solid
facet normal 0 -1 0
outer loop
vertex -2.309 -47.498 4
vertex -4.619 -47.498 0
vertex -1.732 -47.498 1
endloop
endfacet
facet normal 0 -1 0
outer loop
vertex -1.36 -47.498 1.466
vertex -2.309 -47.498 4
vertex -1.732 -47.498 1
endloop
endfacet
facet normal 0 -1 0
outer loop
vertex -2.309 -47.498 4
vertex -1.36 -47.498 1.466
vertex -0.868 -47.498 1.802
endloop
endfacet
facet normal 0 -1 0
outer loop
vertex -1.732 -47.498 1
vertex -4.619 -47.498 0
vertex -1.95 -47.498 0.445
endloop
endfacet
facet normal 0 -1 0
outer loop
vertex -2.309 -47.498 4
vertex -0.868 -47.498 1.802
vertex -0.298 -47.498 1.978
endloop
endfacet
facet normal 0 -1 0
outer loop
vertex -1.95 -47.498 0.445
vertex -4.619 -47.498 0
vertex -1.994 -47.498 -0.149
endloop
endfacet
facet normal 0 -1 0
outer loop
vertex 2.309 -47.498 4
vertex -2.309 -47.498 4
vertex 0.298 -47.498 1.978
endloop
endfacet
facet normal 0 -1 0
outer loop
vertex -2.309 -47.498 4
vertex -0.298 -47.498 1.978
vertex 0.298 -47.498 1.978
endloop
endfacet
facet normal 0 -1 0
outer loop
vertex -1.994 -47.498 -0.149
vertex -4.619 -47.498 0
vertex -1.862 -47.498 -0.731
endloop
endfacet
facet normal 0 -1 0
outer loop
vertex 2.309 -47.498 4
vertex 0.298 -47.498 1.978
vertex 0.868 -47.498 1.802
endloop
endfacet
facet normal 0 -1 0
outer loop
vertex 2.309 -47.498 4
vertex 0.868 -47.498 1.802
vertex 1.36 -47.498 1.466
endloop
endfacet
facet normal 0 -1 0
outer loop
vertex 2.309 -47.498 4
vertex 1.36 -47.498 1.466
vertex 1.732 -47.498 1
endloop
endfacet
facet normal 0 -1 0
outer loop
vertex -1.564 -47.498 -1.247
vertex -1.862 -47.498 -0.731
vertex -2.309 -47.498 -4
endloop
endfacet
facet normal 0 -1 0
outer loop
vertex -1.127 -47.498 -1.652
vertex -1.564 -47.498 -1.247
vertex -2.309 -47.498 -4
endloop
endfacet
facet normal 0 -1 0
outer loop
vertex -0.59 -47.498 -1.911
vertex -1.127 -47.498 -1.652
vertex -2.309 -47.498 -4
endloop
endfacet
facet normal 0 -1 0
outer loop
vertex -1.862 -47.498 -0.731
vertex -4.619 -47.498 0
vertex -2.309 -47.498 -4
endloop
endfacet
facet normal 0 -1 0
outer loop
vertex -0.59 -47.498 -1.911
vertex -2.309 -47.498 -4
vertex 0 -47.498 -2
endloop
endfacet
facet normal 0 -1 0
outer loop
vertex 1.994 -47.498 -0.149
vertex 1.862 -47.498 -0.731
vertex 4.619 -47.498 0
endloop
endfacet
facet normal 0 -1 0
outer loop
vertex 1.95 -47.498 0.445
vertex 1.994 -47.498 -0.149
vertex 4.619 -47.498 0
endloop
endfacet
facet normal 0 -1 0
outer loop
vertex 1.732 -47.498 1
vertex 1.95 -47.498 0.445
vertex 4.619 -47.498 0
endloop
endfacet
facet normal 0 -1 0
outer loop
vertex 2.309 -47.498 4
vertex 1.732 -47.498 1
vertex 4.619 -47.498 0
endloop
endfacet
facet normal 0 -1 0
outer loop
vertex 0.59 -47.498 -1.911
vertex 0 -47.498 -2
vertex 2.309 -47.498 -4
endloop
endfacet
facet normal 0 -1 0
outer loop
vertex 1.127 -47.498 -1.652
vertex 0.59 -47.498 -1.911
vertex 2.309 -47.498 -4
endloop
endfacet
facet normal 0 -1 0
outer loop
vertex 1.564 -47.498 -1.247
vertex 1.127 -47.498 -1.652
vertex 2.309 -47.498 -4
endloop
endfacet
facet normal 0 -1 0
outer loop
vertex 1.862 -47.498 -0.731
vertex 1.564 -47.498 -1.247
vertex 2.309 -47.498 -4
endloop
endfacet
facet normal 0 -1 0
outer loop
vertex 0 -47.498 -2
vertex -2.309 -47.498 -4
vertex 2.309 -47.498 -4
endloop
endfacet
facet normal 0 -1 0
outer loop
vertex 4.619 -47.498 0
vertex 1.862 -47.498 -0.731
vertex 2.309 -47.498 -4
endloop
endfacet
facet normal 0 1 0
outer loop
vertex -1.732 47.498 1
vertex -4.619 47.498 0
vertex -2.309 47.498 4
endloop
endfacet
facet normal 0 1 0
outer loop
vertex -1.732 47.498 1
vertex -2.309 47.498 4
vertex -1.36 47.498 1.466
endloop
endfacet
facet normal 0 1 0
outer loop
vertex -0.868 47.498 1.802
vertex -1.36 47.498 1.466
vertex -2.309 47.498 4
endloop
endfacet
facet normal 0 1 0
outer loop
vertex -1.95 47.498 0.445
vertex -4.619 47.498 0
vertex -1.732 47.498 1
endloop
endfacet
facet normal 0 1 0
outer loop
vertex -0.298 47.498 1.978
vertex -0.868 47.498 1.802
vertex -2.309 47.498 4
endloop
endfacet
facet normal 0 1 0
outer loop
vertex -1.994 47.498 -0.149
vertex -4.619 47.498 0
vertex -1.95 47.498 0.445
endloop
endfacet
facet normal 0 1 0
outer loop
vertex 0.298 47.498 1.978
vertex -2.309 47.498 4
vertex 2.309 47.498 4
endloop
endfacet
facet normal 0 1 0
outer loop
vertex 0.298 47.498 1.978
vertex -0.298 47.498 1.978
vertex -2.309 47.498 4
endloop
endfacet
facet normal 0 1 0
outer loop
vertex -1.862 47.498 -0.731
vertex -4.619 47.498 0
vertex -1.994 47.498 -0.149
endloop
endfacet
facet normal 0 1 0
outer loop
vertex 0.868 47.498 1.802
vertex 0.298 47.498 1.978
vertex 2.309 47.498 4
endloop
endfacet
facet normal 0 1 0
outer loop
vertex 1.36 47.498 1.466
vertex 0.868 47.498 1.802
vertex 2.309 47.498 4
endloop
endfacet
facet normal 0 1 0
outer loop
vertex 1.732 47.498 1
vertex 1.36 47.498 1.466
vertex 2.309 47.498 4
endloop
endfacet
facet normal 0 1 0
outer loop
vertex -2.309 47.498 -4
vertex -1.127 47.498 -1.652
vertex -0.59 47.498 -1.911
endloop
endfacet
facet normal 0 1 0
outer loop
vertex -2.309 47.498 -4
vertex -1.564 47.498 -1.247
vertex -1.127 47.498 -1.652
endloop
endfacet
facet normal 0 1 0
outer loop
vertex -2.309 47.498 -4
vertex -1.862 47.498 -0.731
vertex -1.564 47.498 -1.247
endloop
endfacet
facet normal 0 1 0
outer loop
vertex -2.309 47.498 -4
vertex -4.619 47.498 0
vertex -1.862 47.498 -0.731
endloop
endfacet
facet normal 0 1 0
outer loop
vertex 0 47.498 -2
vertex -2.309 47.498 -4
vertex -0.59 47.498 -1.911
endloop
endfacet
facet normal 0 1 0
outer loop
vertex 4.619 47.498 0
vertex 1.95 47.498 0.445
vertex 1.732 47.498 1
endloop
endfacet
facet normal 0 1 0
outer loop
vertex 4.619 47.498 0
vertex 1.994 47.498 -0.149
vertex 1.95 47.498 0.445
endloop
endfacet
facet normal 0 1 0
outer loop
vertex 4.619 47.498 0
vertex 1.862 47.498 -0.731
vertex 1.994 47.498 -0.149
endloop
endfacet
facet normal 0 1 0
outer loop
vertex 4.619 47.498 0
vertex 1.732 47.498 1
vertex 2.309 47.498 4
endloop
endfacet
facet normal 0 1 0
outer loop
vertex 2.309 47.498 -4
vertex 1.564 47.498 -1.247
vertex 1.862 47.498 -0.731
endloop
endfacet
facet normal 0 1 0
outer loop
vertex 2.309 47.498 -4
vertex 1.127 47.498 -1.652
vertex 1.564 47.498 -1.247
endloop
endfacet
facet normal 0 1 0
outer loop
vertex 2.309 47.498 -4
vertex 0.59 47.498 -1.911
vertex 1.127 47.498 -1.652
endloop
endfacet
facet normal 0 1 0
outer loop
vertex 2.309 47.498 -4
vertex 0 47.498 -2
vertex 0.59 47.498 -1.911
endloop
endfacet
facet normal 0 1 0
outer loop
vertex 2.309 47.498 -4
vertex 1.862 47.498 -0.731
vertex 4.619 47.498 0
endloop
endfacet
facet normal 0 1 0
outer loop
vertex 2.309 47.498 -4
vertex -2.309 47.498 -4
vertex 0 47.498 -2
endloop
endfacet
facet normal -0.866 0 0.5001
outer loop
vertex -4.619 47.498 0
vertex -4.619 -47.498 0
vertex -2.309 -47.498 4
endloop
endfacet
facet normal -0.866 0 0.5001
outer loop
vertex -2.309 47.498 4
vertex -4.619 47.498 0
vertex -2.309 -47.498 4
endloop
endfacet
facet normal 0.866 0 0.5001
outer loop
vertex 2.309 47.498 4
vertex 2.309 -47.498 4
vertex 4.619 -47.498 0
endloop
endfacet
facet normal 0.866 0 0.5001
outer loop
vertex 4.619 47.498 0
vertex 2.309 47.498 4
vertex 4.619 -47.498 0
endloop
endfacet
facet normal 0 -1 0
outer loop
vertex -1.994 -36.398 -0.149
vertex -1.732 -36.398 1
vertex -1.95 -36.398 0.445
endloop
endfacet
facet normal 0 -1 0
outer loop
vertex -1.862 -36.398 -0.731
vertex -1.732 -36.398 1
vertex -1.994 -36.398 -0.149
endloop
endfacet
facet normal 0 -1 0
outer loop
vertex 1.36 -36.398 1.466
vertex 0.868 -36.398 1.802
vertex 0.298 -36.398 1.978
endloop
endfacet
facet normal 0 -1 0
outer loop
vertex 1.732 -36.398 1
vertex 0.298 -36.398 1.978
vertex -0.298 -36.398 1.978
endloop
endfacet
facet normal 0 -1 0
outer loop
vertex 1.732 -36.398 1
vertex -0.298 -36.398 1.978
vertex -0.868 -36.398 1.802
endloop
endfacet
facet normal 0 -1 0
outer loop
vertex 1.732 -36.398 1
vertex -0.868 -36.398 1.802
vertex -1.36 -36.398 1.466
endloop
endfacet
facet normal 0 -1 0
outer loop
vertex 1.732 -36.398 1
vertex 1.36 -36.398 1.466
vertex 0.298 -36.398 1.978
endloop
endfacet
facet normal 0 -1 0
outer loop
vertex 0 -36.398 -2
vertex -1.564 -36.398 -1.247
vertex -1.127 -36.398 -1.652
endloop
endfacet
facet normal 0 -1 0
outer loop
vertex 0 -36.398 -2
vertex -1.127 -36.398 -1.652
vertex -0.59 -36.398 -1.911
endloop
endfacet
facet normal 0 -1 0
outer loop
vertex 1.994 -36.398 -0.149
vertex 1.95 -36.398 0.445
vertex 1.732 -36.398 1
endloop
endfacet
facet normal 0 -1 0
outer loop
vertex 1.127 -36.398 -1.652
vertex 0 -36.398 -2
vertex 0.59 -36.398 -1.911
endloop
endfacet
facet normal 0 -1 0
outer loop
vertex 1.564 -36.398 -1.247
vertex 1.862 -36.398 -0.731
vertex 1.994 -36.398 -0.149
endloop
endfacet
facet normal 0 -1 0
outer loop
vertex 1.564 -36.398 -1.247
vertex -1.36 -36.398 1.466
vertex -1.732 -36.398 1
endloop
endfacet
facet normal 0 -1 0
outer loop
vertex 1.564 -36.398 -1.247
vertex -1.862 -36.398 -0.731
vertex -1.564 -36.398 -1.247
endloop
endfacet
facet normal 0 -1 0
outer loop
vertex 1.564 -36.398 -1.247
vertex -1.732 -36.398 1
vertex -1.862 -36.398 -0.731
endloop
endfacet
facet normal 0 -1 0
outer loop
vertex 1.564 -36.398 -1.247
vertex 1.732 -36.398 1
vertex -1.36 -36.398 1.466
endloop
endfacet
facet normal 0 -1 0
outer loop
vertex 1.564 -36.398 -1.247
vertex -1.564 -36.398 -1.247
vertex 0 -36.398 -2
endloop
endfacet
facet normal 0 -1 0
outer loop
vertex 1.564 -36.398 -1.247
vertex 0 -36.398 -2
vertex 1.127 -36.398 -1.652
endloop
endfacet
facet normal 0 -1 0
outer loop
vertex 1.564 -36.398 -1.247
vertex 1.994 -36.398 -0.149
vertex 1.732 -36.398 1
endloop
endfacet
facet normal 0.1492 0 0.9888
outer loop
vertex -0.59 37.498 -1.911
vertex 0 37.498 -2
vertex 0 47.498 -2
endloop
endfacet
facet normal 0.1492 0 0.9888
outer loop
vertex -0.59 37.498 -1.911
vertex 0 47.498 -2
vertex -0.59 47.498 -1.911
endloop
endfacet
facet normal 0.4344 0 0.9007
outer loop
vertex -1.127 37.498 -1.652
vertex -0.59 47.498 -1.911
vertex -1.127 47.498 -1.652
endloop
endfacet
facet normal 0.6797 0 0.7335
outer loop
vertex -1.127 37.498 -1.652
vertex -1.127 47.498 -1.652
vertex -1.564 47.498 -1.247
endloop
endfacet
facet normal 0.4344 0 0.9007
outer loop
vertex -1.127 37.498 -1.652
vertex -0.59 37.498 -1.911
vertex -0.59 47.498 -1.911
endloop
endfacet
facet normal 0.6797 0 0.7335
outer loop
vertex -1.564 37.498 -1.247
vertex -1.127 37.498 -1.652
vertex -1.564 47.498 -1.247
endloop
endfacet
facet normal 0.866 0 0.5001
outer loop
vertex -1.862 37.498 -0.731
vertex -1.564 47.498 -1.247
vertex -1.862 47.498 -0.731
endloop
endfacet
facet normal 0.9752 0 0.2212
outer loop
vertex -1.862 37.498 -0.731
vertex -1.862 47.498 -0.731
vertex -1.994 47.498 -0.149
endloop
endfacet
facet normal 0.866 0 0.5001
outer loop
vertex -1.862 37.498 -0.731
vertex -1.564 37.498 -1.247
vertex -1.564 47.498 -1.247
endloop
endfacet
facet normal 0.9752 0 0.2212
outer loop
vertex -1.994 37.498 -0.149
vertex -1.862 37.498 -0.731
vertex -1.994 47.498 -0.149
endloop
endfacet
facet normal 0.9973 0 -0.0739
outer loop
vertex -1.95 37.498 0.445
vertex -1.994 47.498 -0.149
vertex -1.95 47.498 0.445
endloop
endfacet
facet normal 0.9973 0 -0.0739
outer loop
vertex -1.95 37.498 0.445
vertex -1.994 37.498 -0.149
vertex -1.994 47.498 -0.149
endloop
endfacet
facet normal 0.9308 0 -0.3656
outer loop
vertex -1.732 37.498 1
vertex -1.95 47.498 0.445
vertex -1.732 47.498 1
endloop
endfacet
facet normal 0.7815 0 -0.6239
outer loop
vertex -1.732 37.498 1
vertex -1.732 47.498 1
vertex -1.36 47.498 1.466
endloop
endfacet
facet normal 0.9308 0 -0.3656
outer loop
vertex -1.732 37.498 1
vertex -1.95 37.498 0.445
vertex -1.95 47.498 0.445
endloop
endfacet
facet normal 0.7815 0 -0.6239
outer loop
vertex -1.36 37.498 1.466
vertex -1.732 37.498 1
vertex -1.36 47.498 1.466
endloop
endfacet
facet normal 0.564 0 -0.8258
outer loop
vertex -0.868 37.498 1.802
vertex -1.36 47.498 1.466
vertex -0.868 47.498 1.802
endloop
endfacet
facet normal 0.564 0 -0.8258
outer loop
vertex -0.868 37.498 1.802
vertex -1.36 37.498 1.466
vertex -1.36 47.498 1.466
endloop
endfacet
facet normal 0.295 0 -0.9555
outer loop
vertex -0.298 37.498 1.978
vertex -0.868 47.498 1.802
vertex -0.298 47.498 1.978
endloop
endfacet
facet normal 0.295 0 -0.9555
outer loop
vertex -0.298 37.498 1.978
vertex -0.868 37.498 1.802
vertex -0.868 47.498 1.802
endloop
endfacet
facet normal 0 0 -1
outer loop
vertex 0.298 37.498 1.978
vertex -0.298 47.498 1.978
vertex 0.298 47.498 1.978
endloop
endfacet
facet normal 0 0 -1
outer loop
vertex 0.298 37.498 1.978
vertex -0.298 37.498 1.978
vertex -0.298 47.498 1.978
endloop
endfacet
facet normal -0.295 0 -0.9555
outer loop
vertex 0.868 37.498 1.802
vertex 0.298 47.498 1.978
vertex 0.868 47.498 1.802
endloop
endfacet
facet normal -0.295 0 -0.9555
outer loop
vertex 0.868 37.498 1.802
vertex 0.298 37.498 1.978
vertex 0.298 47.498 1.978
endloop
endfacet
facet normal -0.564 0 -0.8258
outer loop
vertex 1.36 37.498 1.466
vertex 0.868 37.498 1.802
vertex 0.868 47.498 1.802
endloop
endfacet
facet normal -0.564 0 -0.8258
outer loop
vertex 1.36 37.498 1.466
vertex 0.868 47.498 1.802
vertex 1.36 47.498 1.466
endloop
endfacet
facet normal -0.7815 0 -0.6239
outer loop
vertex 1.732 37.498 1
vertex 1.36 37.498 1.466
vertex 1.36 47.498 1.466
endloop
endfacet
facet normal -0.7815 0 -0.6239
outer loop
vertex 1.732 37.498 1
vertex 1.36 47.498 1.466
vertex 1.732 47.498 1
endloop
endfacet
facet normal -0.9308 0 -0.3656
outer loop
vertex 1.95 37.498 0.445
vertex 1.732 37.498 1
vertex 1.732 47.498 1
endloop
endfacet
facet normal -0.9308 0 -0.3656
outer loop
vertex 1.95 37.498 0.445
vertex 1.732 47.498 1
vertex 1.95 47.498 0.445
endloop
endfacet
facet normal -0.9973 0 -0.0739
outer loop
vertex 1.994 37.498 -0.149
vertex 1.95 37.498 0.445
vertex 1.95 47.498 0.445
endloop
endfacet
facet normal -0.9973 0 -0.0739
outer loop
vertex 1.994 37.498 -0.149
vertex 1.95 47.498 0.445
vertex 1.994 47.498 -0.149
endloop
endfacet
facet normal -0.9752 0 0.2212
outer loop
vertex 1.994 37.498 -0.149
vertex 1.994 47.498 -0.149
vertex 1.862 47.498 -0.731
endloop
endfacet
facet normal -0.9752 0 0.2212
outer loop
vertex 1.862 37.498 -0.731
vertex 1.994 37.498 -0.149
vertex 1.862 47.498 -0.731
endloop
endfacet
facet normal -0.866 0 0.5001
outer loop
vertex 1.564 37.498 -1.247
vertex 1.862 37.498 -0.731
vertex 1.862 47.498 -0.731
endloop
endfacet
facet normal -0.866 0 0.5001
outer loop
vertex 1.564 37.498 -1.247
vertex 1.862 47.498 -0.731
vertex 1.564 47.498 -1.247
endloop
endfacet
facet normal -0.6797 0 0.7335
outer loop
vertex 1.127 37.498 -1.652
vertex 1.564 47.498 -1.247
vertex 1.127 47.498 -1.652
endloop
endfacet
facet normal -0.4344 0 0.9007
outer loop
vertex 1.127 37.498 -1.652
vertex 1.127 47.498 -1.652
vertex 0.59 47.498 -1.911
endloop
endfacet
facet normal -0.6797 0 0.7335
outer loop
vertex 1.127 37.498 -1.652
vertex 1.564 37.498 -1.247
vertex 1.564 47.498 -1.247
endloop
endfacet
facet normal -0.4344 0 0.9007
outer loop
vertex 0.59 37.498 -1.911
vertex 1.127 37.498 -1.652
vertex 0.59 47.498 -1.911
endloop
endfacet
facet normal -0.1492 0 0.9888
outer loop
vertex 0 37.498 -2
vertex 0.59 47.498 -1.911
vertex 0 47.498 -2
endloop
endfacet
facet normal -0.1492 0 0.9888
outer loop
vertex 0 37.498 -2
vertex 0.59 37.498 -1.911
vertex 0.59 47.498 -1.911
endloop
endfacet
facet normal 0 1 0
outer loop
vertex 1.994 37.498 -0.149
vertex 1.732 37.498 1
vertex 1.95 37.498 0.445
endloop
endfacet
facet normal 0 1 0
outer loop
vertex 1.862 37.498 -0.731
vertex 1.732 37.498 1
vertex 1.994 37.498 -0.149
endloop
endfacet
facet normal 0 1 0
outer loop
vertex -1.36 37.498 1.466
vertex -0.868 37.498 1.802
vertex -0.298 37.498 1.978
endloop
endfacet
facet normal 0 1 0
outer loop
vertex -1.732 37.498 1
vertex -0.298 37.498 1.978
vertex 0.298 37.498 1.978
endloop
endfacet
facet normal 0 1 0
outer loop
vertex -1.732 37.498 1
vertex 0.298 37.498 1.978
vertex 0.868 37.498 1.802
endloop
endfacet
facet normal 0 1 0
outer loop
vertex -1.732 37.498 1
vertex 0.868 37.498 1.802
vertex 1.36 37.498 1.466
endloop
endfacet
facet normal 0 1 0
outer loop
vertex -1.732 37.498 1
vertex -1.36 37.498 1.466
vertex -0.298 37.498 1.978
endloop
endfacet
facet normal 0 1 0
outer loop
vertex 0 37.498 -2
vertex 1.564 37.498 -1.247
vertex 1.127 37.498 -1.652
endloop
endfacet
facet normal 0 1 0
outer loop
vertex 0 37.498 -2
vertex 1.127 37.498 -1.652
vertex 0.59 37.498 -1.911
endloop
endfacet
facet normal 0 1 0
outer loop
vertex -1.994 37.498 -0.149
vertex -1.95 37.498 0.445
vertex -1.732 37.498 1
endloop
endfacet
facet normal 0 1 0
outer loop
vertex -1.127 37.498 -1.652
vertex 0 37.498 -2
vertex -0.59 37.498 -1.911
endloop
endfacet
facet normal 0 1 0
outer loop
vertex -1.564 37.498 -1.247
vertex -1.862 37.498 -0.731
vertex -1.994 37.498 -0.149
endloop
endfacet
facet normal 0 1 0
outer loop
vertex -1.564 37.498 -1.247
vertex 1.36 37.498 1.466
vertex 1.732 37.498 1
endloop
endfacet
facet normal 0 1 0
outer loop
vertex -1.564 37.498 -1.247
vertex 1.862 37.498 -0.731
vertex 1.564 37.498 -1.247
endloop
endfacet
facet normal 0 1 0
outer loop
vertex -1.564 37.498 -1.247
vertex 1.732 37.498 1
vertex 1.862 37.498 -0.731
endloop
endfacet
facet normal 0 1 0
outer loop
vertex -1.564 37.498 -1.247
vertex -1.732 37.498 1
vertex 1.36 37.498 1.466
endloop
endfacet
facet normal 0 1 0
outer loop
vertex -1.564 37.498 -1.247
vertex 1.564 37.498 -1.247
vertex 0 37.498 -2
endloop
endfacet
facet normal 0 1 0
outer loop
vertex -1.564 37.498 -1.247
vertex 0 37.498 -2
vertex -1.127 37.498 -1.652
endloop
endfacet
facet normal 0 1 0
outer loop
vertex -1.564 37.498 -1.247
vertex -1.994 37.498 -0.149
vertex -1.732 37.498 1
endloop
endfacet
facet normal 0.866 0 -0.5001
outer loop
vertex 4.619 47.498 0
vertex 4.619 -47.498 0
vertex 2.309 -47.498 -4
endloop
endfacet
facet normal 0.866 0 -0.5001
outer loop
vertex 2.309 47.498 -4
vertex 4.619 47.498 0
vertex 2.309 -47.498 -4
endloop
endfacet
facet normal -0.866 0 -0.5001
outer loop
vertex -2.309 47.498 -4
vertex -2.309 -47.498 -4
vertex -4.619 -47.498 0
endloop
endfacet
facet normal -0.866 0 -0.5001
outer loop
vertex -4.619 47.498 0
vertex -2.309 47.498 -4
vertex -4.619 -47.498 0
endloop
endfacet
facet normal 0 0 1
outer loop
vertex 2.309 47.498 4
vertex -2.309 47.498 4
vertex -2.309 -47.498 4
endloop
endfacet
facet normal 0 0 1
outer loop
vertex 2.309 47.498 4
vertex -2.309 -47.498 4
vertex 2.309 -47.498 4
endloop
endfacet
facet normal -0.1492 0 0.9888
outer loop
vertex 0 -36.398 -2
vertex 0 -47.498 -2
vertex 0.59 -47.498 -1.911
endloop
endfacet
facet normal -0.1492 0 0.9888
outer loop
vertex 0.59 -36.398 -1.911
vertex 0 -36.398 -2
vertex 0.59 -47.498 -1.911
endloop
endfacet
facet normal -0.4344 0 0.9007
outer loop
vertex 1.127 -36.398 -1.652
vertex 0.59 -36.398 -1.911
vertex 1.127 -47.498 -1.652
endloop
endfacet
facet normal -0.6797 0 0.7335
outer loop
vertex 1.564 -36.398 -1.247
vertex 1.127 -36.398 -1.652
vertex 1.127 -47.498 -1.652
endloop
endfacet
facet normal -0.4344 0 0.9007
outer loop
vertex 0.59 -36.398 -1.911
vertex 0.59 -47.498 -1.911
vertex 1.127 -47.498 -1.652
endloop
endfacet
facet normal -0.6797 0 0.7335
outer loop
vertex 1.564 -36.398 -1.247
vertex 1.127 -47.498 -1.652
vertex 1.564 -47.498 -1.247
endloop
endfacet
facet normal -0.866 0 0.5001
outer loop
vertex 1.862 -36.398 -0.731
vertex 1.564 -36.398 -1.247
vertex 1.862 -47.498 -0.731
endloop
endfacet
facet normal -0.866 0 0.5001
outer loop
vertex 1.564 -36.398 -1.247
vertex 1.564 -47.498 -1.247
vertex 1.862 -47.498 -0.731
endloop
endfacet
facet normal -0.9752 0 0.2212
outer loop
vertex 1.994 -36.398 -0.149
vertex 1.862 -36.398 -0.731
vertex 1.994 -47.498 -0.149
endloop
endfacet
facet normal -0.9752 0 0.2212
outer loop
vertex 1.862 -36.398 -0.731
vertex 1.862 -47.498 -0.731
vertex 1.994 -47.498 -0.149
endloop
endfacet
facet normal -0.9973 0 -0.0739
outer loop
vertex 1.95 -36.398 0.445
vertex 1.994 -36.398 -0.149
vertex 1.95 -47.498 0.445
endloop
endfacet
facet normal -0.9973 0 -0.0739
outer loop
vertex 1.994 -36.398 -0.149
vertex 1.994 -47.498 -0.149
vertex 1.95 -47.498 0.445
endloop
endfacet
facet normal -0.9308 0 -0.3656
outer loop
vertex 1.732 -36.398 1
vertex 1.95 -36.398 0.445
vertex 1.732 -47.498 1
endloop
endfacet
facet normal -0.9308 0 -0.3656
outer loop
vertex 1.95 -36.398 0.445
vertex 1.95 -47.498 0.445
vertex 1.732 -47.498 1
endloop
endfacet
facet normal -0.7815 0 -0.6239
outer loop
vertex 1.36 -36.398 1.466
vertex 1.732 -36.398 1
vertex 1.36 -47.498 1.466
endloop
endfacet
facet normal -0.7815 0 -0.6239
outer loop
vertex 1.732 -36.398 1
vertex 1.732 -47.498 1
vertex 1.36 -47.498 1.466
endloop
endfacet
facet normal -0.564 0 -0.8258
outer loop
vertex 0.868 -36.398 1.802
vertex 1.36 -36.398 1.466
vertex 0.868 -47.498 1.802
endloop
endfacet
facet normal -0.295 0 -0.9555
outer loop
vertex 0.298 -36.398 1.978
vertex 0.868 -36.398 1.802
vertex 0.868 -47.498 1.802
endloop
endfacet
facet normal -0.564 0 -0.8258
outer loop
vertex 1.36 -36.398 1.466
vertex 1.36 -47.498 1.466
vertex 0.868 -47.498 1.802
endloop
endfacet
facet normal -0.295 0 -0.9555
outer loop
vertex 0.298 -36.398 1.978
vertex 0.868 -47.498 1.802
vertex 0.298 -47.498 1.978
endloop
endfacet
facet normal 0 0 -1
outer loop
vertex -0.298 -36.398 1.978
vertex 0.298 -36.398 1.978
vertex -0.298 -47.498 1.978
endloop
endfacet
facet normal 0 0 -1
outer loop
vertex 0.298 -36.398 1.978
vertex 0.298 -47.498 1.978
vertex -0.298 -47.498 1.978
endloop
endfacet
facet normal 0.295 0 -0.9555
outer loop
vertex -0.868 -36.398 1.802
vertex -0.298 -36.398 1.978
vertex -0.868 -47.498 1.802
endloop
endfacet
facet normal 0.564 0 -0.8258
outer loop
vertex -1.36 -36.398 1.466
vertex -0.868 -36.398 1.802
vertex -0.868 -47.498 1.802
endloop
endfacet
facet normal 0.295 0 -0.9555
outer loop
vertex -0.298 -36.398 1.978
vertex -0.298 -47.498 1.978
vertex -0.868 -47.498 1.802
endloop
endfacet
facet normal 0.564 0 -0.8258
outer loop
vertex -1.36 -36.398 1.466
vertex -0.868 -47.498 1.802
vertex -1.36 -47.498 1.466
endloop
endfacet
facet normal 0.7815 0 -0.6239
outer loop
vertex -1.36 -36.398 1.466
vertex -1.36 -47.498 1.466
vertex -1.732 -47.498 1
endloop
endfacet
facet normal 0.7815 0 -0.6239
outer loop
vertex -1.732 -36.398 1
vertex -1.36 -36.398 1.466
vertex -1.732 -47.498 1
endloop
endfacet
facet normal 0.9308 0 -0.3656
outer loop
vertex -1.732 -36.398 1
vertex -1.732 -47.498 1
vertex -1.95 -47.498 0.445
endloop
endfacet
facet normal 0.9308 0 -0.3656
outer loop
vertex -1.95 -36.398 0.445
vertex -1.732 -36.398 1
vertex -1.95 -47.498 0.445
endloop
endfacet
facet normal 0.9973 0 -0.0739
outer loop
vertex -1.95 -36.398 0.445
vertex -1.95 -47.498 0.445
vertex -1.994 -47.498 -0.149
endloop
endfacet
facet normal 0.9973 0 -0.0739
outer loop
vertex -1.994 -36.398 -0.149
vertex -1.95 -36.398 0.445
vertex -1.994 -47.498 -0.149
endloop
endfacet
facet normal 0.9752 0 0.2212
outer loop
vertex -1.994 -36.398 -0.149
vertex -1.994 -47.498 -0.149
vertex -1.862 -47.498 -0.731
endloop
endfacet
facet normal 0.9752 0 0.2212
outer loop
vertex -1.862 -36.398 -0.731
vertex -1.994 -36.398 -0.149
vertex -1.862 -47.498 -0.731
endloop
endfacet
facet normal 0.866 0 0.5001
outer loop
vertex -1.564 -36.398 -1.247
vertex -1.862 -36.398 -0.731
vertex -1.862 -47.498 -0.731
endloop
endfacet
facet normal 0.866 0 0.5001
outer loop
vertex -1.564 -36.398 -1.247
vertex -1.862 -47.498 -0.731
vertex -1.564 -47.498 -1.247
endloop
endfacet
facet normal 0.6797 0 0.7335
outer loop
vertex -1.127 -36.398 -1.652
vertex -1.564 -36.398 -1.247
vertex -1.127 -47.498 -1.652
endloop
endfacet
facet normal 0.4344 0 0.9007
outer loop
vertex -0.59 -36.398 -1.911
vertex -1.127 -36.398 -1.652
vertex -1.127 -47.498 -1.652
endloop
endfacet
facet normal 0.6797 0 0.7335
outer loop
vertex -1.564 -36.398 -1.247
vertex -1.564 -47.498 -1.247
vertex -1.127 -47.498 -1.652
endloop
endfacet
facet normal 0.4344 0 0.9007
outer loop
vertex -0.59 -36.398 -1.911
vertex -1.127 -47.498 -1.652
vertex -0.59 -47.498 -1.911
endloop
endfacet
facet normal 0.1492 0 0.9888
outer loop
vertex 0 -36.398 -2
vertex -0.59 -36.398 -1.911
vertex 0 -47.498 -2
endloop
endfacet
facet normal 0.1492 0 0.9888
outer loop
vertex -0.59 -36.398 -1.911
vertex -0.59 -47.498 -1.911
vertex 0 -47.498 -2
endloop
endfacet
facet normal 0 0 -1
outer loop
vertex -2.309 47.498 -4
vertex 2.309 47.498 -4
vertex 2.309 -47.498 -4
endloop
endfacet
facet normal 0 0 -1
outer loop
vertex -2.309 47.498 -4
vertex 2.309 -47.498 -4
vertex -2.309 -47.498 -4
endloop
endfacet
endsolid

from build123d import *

# Parameters (mm, degrees)
BOSS_EXTRUDE1_DEPTH      = 47.498
BOSS_EXTRUDE1_DEPTH_BACK = 47.498
SKETCH3_R                = 2
CUT_EXTRUDE1_DEPTH       = 11.1
CUT_EXTRUDE2_START       = -10
SKETCH2_R                = 2
CUT_EXTRUDE2_DEPTH       = 10


with BuildPart() as part:
    # Sketch1 → Boss-Extrude1 (new, two sides: drawn at the far end of the back side and taken through both)
    with BuildSketch(Plane(origin=(0, 0, 0), x_dir=(1, 0, 0), z_dir=(0, 1, 0)).offset(-BOSS_EXTRUDE1_DEPTH_BACK)):
        Polygon((2.309401077, 4), (-2.309401077, 4), (-4.618802154, 0), (-2.309401077, -4), (2.309401077, -4), (4.618802154, 0), align=None)
    extrude(amount=BOSS_EXTRUDE1_DEPTH + BOSS_EXTRUDE1_DEPTH_BACK)

    # Sketch3 → Cut-Extrude1 (cut)
    with BuildSketch(Plane.XZ.offset(47.498)):
        Circle(SKETCH3_R)
    extrude(amount=-CUT_EXTRUDE1_DEPTH, mode=Mode.SUBTRACT)

    # Sketch2 → Cut-Extrude2 (cut)
    with BuildSketch(Plane(origin=(0, 47.498, 0), x_dir=(1, 0, 0), z_dir=(0, 1, 0)).offset(CUT_EXTRUDE2_START)):
        Circle(SKETCH2_R)
    extrude(amount=CUT_EXTRUDE2_DEPTH, mode=Mode.SUBTRACT)


solid = part.part
